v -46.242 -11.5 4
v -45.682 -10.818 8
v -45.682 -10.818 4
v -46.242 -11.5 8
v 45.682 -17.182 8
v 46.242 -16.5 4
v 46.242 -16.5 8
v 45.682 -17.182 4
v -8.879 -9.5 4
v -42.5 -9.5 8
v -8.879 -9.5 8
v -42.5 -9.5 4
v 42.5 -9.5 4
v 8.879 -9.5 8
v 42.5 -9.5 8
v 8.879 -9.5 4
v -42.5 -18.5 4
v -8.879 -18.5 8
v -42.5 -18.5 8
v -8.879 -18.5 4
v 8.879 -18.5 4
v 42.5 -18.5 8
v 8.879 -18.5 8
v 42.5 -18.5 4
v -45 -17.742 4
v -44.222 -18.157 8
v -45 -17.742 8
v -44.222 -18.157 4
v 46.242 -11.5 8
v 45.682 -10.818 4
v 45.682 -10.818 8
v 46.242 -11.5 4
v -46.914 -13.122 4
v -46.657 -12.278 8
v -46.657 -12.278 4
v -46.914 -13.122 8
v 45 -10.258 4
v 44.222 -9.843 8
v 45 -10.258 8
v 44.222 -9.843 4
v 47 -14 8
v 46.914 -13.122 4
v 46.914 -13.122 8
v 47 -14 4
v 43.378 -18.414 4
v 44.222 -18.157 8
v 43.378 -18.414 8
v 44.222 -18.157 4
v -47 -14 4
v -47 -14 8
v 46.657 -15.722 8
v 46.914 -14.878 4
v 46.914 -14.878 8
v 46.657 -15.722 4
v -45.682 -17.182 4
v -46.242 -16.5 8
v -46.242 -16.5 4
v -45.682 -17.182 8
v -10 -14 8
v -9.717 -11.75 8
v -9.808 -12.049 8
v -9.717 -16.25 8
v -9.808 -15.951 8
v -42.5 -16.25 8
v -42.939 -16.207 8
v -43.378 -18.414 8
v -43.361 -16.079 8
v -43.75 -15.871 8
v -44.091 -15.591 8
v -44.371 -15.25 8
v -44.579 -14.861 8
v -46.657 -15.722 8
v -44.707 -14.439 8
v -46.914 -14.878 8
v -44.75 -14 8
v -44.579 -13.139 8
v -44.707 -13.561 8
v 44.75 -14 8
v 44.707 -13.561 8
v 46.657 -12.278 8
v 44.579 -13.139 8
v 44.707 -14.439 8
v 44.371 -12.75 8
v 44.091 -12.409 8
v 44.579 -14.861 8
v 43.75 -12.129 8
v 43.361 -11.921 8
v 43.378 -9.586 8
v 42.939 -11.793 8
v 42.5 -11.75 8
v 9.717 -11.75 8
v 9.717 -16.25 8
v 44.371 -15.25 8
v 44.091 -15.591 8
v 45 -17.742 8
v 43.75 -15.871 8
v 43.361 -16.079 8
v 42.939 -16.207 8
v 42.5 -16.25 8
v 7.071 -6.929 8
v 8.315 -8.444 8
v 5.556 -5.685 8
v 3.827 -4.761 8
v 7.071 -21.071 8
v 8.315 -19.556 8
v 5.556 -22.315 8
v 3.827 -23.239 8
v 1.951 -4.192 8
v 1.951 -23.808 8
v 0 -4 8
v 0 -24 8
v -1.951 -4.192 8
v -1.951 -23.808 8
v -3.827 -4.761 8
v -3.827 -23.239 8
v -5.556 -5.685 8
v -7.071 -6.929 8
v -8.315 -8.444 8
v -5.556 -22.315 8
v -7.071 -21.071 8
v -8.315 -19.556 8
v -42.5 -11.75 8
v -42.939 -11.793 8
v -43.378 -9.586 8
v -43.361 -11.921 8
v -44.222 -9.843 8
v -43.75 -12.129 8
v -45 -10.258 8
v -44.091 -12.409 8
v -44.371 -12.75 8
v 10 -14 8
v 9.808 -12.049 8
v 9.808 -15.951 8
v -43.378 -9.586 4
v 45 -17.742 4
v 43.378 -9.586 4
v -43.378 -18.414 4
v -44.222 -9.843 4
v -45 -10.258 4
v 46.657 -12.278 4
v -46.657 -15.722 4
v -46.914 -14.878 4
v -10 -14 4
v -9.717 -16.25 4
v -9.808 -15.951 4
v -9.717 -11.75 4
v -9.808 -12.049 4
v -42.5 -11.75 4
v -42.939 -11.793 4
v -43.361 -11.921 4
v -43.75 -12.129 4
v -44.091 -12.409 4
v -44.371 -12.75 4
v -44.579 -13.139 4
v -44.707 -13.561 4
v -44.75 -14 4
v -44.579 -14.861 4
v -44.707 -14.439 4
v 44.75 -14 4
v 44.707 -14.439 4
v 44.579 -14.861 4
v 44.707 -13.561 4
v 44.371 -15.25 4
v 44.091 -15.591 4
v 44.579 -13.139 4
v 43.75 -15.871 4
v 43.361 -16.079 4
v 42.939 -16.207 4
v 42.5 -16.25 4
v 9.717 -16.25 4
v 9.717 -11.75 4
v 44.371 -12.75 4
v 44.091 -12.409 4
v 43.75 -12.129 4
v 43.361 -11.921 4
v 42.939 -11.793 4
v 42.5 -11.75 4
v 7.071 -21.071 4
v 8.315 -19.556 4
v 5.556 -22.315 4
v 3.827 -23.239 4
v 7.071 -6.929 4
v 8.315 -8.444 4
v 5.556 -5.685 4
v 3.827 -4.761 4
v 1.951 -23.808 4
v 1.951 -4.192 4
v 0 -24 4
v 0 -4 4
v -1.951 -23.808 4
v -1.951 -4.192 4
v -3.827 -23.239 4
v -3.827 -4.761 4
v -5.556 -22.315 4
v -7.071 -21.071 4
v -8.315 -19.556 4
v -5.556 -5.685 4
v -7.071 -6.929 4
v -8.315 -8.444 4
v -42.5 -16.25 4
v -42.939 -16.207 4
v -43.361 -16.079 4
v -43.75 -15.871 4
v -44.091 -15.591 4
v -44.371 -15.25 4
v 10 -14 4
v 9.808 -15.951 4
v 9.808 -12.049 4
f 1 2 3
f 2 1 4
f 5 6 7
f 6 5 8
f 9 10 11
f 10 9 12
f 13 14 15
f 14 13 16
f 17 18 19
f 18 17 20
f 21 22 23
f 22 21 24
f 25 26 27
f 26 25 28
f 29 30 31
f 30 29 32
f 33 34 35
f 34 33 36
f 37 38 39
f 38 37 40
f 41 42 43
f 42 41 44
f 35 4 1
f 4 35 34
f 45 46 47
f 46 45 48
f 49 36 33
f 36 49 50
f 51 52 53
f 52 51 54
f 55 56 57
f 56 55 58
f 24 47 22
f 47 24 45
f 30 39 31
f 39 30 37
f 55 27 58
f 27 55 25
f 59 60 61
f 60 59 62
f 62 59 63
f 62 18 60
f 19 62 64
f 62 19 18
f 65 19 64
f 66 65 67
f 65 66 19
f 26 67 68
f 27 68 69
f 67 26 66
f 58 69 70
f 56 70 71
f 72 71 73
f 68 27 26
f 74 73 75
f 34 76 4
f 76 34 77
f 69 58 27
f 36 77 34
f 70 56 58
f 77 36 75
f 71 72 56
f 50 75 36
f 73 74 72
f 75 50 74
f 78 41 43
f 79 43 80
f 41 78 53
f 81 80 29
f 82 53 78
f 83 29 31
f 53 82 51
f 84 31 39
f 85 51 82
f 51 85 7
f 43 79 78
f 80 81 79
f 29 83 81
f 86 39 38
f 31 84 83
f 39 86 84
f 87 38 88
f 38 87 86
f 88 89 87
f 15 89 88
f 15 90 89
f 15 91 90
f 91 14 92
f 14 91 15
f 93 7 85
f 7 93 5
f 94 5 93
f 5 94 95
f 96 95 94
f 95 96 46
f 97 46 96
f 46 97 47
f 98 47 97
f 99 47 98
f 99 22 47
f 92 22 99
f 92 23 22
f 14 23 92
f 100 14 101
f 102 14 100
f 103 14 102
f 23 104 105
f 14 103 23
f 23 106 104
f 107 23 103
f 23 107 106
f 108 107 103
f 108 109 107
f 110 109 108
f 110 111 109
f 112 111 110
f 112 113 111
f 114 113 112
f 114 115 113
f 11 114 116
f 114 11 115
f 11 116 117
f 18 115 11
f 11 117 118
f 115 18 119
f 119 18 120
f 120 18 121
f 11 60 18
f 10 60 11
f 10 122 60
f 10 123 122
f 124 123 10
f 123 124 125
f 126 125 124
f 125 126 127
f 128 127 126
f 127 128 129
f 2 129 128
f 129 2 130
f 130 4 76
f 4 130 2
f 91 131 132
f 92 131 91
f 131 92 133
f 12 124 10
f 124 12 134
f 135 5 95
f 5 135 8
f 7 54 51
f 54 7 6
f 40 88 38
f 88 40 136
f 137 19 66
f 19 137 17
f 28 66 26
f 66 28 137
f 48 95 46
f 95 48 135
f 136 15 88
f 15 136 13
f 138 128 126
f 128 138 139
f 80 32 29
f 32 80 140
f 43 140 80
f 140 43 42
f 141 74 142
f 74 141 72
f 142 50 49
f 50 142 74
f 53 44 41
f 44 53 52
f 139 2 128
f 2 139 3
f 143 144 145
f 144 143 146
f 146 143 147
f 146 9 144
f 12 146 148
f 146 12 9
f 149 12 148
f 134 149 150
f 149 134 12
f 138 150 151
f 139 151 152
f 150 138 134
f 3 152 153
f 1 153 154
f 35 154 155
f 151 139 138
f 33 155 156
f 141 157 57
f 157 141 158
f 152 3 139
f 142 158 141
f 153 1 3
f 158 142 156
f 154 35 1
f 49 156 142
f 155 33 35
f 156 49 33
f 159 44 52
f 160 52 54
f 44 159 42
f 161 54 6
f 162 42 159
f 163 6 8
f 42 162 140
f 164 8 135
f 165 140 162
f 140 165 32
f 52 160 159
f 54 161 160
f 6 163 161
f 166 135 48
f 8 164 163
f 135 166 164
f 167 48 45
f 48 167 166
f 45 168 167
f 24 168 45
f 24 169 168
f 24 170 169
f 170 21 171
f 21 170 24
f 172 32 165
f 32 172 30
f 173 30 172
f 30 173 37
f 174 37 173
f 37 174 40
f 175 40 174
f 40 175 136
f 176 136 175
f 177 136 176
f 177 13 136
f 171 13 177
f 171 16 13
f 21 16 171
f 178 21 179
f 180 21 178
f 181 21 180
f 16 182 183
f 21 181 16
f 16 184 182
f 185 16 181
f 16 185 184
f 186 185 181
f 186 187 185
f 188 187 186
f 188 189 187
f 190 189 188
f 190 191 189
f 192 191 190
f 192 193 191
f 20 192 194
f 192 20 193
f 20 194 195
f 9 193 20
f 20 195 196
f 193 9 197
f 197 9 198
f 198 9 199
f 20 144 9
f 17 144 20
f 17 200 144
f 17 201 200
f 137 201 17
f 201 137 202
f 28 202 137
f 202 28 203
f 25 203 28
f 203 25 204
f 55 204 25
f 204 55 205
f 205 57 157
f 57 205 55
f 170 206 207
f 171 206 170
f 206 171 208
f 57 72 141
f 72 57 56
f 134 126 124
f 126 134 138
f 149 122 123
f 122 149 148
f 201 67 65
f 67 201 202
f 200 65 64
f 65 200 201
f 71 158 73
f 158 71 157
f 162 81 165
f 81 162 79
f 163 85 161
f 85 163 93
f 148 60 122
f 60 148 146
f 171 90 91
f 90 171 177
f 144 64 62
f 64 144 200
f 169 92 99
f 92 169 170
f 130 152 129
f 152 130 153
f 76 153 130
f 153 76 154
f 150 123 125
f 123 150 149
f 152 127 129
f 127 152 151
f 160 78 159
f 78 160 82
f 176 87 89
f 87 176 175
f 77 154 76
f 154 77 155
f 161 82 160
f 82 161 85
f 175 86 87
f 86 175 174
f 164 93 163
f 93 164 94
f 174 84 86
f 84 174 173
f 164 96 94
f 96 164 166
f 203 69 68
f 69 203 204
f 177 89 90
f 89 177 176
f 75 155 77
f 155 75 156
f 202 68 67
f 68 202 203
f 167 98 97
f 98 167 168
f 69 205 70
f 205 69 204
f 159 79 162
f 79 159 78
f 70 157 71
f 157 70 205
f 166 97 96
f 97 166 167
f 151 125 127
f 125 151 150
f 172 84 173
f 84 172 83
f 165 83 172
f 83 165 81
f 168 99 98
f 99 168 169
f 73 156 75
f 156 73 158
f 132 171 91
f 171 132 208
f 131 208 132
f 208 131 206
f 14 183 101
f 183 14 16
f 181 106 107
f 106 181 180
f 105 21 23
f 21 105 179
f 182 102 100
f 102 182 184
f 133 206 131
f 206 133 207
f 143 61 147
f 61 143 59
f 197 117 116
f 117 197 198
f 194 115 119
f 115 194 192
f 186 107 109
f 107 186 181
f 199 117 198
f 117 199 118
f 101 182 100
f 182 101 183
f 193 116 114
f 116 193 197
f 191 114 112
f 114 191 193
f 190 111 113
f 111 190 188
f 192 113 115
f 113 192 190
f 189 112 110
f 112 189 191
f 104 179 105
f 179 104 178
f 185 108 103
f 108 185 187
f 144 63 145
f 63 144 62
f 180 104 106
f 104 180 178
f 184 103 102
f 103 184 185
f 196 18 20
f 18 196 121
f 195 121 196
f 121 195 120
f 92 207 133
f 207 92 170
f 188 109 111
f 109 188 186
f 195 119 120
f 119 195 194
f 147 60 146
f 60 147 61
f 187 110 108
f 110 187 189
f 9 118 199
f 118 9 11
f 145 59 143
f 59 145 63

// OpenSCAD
len_phone = 145;
d_screw_m4 = 4.5;
width_phone = 56;
thikness_holder = 4;
thikness_phone = 8;
append = 15;
corner_round = 8;
w_grip = 30;


//holder_set();
//vertical_block(len_phone);


test_print_holder();


module test_print_holder() {
    translate([0, -24, 6])
    //grip();
    horizontal_block(70, offset_vertical=10);
}




module grip() {
    difference() {
        grip_base();
        
        color("red")
        translate([0, w_grip/2, thikness_phone])
        cube([w_grip+1, w_grip, 2*thikness_phone], center=true);
        
        translate([0, -w_grip/4, 0])
        cylinder(d=d_screw_m4, 3*thikness_phone, center=true, $fn=32);
    }
}




module grip_base() {
    hull() {
        translate([w_grip/2-corner_round/2, -w_grip/2, 0])
        cylinder(d=corner_round, 2*thikness_phone, center=true);
        
        translate([-w_grip/2+corner_round/2, -w_grip/2, 0])
        cylinder(d=corner_round, 2*thikness_phone, center=true);
        
        translate([w_grip/2-corner_round/2, w_grip/2, 0])
        cylinder(d=corner_round, 2*thikness_phone, center=true);
        
        translate([-w_grip/2+corner_round/2, w_grip/2, 0])
        cylinder(d=corner_round, 2*thikness_phone, center=true);
    }
}




module horizontal_block(len_block, offset_vertical) {
    len_block = len_block + append;
    
    translate([0, offset_vertical, 0])
    cylinder(d=20, h=thikness_holder, center=true, $fn=32);
    
    difference() {
        hull() {
            translate([len_block/2, offset_vertical, 0])
            cylinder(d=9, h=thikness_holder, center=true, $fn=32);
            
            translate([-len_block/2, offset_vertical, 0])
            cylinder(d=9, h=thikness_holder, center=true, $fn=32);
        }
        color("red")
        hull() {
            translate([len_block/2, offset_vertical, 0])
            cylinder(d=d_screw_m4, h=thikness_holder+2, center=true, $fn=32);
            
            translate([-len_block/2, offset_vertical, 0])
            cylinder(d=d_screw_m4, h=thikness_holder+2, center=true, $fn=32);
        }
    }
}




module vertical_block(len_block) {
    len_block = len_block + append;
    
        difference() {
            hull() {
                //translate([0, -len_phone/2, 0])
                translate([0, -len_block/2, 0])
                cylinder(d=9, h=thikness_holder, center=true, $fn=32);
                
                //translate([0, -len_phone/2, 0])
                translate([0, len_block/2, 0])
                cylinder(d=9, h=thikness_holder, center=true, $fn=32);
            }
            color("red")
            hull() {
                //translate([0, -len_phone/2, 0])
                translate([0, -len_block/2, 0])
                cylinder(d=d_screw_m4, h=thikness_holder+2, center=true, $fn=32);
                
                //translate([0, -len_phone/2, 0])
                translate([0, len_block/2, 0])
                cylinder(d=d_screw_m4, h=thikness_holder+2, center=true, $fn=32);
        }
    }
}




module holder_set() {
    holder_base();
    
    translate([0, -len_phone/2, thikness_phone+thikness_holder/2+1])
    rotate([0, 180, 0])
    grip();
    
    translate([0, len_phone/2, thikness_phone+thikness_holder/2])
    rotate([0, 180, 180])
    grip();
    
    translate([width_phone/2, 10, thikness_phone+thikness_holder/2])
    rotate([0, 180, 90])
    grip();
    
    translate([-width_phone/2, 10, thikness_phone+thikness_holder/2])
    rotate([0, 180, -90])
    grip();
}




module holder_base() {
    horizontal_block(len_block=width_phone, offset_vertical=10);
    vertical_block(len_block=len_phone);
}
